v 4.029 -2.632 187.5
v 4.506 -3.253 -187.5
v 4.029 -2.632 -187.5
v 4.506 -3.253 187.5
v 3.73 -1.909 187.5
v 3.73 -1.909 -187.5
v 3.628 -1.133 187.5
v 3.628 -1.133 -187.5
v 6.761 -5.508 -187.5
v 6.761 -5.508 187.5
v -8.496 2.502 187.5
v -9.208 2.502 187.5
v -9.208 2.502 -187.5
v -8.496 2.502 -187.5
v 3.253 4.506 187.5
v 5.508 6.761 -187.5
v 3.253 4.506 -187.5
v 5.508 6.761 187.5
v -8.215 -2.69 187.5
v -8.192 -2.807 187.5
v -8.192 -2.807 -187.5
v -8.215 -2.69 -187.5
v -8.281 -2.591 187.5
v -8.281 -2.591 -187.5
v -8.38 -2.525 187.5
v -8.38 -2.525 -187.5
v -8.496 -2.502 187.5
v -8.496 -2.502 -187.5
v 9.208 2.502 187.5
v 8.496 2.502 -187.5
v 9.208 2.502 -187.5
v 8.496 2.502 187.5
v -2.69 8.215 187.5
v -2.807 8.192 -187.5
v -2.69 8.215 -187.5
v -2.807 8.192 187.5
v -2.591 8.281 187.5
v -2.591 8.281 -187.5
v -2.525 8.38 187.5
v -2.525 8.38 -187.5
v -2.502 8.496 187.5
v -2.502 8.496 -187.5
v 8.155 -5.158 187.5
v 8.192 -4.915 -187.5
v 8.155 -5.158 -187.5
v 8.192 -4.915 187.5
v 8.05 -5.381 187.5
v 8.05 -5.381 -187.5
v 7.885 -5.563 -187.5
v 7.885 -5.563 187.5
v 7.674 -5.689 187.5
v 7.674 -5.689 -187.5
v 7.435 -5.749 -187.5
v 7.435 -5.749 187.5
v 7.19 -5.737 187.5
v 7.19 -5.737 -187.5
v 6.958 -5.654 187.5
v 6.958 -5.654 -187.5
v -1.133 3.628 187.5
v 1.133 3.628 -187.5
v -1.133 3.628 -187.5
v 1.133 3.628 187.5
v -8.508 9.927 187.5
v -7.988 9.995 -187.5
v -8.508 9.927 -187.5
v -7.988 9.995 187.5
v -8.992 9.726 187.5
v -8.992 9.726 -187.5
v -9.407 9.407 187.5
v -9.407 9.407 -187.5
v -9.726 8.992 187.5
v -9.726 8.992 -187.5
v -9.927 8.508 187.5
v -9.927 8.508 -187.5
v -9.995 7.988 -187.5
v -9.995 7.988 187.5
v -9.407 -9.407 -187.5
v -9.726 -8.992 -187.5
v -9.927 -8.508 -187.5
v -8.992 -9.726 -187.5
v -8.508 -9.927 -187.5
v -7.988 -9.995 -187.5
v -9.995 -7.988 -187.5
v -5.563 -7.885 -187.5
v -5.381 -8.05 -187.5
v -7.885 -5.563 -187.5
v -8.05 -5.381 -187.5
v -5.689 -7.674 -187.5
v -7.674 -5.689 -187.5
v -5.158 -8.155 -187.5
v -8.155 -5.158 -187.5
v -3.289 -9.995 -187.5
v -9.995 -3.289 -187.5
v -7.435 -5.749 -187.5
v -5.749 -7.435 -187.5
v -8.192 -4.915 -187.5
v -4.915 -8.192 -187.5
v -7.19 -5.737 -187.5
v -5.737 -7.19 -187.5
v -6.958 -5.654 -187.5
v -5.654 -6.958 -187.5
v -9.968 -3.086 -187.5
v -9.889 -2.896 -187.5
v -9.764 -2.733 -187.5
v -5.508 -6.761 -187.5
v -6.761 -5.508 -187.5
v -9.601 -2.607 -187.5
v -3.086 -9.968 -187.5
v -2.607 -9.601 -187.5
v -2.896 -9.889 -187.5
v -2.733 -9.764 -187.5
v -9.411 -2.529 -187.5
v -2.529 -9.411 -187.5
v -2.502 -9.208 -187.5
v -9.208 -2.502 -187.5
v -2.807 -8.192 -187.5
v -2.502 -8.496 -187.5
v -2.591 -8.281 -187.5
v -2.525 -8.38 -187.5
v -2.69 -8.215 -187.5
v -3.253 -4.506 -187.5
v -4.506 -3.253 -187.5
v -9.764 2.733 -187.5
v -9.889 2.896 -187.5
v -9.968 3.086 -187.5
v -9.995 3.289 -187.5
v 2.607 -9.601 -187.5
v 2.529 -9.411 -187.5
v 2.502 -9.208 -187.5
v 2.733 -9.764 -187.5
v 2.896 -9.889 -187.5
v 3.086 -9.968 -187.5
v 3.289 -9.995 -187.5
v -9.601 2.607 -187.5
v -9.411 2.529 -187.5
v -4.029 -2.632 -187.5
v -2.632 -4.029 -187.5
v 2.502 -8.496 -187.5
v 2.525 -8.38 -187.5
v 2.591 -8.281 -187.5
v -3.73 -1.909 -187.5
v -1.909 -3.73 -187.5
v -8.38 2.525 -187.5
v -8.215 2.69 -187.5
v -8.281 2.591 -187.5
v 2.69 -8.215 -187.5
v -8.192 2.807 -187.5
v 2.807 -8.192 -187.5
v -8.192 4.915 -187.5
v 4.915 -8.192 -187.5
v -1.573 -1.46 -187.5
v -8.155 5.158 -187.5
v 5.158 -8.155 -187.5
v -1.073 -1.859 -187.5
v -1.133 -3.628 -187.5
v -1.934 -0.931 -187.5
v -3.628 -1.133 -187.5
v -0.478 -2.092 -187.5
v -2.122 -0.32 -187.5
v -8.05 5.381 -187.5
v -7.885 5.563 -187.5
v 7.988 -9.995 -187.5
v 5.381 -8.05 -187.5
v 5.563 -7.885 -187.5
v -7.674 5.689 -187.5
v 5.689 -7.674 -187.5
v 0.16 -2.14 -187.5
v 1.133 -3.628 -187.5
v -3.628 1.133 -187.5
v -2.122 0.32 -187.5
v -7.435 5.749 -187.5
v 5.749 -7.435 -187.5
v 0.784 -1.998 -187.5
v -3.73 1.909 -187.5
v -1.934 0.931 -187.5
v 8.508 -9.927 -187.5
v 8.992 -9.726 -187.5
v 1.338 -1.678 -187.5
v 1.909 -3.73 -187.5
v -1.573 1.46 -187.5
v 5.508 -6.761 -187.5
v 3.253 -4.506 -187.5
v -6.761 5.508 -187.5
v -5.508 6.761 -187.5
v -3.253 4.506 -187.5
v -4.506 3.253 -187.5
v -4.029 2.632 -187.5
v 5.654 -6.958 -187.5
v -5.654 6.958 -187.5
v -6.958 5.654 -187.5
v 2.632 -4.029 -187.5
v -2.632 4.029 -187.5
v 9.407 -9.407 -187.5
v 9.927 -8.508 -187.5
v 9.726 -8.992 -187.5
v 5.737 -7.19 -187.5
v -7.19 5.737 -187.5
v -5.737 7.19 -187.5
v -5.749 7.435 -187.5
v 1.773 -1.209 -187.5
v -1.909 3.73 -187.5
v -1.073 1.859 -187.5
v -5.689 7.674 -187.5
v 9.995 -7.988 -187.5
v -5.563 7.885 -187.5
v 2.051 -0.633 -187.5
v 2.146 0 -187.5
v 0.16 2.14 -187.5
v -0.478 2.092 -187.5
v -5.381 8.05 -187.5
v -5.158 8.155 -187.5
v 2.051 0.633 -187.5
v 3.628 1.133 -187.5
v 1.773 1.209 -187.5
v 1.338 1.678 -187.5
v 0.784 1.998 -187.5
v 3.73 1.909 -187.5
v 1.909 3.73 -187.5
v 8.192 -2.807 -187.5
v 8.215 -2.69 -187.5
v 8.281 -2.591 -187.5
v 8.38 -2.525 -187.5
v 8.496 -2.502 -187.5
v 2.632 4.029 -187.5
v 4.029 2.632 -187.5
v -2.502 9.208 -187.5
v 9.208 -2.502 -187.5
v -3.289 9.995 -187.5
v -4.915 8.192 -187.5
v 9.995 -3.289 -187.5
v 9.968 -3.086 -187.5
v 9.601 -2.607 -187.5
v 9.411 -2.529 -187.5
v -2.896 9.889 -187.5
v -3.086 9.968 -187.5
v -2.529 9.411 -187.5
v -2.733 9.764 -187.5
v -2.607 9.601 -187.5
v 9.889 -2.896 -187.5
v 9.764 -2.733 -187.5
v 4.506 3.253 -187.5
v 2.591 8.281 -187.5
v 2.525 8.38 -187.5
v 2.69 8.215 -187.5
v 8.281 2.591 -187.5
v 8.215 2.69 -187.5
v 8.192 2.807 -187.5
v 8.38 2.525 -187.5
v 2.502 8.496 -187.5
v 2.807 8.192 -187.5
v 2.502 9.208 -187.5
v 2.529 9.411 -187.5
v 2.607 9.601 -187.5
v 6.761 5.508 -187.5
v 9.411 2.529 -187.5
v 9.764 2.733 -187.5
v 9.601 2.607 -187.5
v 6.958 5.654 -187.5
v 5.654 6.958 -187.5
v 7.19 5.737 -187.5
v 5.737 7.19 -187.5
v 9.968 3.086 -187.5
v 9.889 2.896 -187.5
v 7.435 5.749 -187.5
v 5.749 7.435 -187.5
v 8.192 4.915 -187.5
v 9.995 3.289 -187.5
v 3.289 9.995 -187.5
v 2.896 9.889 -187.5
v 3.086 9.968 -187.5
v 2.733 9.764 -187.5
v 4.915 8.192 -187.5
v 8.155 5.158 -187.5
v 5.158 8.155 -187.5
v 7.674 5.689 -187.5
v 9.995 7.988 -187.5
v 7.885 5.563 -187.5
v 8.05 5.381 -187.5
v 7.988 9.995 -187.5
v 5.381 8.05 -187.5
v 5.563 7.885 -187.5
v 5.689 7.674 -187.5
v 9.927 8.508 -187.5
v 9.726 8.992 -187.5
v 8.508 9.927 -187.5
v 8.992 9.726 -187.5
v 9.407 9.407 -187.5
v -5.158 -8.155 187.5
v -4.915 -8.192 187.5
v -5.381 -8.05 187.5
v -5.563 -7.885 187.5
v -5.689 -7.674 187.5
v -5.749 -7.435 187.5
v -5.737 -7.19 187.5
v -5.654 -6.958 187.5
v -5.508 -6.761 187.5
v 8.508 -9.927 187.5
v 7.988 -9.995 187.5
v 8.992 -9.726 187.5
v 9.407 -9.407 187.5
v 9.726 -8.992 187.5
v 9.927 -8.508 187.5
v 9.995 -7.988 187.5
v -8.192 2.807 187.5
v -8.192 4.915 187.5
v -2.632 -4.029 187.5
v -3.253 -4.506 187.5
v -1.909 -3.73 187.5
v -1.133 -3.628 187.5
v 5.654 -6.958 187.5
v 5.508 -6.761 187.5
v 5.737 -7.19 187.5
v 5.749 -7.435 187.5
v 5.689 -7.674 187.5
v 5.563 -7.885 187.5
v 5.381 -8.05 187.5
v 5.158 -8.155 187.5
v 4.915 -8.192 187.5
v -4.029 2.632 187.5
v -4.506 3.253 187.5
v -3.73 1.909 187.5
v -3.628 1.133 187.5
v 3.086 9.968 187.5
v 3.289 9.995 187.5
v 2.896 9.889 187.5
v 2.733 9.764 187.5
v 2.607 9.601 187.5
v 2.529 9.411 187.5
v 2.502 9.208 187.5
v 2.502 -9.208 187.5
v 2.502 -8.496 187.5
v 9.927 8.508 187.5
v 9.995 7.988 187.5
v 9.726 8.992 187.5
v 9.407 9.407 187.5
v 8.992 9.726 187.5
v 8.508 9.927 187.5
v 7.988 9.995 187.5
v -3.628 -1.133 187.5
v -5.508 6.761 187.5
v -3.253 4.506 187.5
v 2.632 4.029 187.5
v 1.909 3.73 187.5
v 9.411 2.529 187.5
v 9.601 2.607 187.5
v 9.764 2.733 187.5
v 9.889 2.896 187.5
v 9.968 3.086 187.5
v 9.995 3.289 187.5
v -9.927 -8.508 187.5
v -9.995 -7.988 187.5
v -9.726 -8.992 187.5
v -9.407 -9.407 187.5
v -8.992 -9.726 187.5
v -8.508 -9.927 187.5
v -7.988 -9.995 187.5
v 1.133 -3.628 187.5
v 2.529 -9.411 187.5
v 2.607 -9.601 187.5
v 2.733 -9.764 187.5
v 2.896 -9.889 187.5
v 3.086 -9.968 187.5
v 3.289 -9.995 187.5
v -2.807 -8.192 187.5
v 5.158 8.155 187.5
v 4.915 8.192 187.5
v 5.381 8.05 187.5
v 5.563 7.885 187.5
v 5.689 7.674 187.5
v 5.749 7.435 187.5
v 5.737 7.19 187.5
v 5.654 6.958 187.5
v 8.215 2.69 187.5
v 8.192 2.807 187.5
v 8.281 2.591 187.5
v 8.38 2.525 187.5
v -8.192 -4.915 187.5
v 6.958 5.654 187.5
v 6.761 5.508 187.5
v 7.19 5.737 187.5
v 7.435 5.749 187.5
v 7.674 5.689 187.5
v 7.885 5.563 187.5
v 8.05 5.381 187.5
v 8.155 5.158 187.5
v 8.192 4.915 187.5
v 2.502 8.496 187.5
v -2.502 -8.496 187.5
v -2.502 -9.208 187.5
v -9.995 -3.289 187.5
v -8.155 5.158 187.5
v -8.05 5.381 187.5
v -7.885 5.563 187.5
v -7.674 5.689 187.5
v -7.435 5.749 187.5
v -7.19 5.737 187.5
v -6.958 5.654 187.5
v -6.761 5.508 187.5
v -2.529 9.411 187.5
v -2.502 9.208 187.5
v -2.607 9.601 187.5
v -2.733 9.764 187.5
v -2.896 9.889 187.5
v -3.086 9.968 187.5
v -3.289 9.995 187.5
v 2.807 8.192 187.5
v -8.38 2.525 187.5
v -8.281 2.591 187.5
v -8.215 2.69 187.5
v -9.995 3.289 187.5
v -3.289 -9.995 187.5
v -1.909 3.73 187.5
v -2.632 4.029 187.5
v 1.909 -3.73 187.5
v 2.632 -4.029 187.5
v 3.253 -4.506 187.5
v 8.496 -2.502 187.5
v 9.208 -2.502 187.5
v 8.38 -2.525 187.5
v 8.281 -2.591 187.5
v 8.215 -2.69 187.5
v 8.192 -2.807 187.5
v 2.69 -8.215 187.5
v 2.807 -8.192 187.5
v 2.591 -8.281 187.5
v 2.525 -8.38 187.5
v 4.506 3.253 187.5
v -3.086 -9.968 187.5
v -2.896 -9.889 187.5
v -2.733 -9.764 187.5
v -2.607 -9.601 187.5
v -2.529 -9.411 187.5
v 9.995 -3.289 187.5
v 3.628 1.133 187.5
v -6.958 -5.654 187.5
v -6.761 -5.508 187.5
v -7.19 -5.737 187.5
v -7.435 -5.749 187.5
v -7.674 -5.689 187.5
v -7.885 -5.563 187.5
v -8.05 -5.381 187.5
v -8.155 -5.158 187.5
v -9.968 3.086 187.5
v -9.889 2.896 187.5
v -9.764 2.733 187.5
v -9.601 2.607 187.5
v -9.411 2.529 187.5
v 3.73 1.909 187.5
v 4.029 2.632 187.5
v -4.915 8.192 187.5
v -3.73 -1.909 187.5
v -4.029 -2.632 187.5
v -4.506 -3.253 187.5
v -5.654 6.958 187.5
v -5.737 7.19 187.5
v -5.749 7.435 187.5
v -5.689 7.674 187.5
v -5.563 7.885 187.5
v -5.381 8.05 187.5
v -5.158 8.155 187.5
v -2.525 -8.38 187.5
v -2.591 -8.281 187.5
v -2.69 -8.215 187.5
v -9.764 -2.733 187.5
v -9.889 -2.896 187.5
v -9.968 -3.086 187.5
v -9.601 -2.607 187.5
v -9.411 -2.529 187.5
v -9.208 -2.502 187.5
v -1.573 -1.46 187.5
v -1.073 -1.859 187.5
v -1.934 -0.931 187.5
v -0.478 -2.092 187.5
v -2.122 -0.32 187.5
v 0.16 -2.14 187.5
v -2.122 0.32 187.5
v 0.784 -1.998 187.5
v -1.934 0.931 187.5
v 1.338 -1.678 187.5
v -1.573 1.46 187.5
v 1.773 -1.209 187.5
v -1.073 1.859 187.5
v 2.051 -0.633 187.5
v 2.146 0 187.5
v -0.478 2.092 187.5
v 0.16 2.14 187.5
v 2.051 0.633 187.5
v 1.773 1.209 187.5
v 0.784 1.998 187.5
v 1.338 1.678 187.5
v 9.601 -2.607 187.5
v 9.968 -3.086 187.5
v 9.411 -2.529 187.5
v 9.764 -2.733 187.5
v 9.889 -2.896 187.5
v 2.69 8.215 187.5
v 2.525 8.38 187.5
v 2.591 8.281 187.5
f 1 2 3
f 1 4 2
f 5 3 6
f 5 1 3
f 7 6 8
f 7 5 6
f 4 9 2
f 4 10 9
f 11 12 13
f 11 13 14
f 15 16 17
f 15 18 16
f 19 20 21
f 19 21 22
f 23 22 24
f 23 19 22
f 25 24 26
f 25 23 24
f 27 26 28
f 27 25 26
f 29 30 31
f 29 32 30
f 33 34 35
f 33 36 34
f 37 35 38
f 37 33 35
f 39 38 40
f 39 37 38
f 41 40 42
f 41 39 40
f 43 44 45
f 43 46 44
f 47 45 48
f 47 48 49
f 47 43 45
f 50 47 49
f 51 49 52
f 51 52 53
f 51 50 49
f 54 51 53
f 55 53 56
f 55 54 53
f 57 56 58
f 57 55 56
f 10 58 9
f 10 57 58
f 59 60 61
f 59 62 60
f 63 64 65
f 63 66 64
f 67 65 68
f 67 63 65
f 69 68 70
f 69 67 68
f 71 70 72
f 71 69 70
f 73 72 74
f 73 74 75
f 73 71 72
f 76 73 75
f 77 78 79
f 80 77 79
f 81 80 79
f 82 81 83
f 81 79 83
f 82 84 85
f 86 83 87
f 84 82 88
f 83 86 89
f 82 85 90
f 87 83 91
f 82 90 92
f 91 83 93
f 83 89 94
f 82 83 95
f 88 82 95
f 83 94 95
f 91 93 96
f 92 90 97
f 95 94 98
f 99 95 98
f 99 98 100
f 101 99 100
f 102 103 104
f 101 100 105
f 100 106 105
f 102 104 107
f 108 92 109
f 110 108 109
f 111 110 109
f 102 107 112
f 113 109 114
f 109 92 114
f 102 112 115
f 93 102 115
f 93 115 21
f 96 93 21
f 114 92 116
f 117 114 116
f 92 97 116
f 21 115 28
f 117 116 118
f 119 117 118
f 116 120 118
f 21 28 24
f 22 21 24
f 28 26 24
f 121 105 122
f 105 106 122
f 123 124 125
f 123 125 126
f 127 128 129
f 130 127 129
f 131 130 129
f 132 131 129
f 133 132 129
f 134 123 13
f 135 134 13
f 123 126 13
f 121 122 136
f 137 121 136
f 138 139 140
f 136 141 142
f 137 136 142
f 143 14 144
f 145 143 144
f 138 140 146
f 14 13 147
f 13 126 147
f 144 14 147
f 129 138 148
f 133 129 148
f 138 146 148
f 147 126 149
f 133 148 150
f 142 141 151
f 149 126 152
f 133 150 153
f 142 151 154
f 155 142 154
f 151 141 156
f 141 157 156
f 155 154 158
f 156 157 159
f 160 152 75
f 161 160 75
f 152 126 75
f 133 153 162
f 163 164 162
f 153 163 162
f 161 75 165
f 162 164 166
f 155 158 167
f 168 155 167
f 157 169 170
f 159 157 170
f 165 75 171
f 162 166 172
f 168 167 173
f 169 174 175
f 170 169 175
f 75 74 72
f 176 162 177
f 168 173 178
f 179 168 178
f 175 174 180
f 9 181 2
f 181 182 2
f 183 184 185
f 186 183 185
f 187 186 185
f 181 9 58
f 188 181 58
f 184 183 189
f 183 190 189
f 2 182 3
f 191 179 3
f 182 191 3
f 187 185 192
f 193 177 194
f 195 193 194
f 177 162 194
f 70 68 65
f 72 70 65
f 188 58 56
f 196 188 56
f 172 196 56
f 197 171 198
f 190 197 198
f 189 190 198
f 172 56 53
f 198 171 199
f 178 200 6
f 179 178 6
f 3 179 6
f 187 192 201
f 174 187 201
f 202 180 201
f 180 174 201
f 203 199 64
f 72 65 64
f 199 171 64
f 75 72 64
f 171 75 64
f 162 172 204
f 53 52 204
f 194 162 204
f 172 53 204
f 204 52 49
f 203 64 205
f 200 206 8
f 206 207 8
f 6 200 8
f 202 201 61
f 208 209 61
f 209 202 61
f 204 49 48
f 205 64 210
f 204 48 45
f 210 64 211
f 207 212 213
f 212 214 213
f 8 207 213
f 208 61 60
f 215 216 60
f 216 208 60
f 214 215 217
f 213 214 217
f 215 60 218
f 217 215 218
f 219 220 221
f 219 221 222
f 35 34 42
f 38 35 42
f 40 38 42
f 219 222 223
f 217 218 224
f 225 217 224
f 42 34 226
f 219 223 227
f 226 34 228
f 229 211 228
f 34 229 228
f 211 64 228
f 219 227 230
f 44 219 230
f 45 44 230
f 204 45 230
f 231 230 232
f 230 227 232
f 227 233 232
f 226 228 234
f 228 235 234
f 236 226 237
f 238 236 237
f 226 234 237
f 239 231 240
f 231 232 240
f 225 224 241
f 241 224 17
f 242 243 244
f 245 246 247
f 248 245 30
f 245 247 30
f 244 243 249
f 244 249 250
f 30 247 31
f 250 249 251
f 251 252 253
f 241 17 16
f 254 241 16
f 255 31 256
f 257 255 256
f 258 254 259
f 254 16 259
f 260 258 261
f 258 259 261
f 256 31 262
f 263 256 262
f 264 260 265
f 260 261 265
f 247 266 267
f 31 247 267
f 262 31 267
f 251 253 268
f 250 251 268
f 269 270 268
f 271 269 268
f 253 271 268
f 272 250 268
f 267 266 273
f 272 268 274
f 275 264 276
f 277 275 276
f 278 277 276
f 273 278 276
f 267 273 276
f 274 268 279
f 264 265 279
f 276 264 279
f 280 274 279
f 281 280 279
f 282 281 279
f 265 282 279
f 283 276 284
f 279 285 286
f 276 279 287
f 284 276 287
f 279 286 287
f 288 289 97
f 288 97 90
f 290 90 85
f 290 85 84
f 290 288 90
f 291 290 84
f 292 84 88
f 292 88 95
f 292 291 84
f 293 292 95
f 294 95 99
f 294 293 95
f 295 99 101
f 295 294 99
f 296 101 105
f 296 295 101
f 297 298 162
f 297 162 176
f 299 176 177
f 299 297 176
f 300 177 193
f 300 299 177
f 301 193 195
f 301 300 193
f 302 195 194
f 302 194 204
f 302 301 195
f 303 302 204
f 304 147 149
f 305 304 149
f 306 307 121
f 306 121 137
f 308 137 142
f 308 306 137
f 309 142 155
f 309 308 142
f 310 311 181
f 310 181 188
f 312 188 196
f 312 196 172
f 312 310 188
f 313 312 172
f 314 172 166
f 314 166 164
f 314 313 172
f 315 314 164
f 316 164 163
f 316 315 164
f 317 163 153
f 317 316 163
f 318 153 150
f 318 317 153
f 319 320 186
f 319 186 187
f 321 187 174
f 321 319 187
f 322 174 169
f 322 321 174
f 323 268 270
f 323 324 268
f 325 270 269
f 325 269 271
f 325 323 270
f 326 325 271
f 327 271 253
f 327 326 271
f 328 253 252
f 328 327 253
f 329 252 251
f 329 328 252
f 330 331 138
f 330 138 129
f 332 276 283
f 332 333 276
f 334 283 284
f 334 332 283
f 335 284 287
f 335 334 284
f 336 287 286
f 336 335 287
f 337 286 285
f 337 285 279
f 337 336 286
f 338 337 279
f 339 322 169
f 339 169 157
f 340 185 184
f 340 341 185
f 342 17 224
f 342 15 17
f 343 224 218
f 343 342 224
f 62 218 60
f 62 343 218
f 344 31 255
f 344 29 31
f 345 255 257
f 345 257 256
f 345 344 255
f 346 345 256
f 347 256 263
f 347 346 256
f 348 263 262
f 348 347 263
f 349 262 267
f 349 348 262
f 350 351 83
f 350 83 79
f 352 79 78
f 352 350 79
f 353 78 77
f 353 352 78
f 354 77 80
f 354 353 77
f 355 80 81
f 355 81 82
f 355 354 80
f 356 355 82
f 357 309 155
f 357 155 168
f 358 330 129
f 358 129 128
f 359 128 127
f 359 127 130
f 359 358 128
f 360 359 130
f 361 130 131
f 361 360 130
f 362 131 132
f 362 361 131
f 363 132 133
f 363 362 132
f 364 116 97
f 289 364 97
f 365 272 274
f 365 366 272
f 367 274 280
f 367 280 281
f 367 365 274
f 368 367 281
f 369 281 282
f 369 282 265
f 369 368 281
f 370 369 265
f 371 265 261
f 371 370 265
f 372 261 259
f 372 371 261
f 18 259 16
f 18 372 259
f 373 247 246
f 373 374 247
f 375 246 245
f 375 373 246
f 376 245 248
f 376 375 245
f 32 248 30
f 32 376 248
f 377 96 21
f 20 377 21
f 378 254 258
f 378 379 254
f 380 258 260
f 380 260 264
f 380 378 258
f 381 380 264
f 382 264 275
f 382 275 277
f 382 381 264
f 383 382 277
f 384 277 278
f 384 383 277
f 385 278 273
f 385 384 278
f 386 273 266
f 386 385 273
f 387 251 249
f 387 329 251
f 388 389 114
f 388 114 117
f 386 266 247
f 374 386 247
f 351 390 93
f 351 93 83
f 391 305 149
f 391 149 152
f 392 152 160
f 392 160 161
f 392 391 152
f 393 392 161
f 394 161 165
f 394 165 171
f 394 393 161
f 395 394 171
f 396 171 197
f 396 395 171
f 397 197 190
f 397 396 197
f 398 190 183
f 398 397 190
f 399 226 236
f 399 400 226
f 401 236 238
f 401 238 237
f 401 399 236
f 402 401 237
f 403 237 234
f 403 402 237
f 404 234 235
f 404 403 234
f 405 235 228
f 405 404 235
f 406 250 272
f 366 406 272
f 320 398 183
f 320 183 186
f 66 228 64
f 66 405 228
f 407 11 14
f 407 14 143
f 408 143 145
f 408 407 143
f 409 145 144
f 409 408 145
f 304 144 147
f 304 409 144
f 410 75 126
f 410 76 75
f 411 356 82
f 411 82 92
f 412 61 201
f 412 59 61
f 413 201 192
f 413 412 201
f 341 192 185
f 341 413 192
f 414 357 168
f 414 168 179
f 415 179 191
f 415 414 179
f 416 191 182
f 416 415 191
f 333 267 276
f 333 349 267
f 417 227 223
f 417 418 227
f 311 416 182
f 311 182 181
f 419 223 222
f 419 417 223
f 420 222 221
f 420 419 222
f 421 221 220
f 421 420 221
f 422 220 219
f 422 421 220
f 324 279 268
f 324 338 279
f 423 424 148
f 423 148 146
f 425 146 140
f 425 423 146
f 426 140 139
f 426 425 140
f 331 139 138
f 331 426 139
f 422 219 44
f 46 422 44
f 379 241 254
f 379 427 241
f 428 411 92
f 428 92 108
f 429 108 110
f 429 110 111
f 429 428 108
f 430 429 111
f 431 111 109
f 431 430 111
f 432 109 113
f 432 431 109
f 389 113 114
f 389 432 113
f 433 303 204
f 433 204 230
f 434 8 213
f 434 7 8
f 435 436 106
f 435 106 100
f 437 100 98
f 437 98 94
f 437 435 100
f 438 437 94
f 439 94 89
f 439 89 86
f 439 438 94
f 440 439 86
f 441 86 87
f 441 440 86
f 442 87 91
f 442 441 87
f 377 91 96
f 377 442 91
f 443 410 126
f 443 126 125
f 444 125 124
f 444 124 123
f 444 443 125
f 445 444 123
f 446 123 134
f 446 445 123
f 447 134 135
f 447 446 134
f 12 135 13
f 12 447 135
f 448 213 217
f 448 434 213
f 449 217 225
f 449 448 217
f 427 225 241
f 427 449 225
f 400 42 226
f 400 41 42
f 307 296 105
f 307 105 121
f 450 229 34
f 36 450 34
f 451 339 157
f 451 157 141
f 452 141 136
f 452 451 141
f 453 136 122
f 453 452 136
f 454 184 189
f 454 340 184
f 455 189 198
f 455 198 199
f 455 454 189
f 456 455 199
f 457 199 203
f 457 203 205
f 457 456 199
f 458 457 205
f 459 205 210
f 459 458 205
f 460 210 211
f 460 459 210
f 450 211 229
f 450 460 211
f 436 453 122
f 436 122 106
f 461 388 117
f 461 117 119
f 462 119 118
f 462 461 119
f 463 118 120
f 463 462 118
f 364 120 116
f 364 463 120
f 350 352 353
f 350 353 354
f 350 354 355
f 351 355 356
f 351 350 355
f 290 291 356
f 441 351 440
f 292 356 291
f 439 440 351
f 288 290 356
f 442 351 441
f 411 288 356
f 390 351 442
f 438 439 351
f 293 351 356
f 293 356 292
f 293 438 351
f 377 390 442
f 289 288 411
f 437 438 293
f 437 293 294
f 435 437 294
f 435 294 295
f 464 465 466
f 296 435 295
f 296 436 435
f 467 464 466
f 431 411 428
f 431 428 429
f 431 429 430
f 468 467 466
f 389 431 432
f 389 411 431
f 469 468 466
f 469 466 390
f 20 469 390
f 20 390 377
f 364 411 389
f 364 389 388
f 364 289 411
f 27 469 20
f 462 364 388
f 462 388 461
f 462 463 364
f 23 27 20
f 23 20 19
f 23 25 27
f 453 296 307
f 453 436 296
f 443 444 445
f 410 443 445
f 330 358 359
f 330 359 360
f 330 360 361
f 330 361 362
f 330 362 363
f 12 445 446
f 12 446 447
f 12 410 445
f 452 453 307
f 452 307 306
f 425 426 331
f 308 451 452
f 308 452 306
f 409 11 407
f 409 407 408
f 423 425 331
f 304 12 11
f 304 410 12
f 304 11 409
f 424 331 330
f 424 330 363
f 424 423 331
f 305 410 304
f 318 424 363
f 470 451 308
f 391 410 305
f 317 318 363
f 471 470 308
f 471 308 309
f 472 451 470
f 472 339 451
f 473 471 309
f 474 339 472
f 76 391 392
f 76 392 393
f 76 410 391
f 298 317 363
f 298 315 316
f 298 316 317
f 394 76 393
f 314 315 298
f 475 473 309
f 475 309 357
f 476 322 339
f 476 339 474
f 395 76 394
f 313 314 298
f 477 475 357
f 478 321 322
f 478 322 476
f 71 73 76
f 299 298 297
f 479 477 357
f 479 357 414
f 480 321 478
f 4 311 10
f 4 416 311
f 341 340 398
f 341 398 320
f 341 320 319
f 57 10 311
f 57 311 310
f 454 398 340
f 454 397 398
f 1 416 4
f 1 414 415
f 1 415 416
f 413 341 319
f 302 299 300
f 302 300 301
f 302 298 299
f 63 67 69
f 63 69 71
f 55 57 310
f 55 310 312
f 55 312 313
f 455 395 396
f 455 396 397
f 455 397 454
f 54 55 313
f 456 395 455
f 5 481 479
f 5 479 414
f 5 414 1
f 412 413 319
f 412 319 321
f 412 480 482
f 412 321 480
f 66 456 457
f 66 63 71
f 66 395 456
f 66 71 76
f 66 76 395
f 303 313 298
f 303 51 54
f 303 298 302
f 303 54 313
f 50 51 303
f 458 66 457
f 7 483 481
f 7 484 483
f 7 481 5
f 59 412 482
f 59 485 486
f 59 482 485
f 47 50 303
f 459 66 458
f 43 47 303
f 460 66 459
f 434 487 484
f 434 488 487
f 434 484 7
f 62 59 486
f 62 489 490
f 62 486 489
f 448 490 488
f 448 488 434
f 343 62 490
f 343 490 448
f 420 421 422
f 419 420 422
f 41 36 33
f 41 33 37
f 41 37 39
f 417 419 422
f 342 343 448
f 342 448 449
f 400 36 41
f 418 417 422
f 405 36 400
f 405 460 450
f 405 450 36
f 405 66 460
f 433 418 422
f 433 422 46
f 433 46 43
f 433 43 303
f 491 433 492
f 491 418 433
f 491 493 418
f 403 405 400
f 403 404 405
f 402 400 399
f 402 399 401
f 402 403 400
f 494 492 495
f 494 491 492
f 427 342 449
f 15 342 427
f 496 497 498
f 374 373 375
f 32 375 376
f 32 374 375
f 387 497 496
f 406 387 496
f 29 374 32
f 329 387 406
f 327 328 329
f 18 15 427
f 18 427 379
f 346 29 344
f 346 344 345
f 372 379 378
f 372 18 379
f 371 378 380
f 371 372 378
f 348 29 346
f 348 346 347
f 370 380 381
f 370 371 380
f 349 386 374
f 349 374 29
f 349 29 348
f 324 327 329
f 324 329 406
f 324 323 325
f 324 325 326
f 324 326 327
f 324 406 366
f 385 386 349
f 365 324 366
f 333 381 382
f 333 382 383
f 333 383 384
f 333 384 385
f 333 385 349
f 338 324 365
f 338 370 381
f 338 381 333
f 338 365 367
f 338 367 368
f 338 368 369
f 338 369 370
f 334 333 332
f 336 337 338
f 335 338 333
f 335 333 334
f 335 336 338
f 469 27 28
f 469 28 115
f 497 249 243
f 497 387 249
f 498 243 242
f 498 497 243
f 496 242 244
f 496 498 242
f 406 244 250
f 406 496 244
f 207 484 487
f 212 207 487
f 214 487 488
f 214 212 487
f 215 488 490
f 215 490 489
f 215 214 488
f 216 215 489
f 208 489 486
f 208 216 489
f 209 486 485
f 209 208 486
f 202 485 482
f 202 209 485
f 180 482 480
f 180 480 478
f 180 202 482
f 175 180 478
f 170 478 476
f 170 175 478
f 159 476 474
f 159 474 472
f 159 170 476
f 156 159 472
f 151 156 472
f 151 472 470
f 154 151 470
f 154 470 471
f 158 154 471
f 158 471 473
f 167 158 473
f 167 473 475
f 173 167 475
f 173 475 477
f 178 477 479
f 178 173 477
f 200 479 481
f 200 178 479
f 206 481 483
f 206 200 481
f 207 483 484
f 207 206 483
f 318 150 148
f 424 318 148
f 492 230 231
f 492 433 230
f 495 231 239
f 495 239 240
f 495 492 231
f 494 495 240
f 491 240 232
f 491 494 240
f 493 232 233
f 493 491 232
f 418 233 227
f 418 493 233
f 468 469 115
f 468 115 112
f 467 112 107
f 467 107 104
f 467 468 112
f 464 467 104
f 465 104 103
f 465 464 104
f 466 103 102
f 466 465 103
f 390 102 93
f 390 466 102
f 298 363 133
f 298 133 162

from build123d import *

# Parameters (mm, degrees)
SKETCH1_R           = 2.1463
BOSS_EXTRUDE1_DEPTH = 187.5


with BuildPart() as part:
    # Sketch1 → Boss-Extrude1 (new body, symmetric)
    with BuildSketch(Plane.XY):
        with BuildLine():
            Line((-9.9949, 7.9883), (-9.9949, 3.2893))
            ThreePointArc((-9.9949, 3.2893), (-9.76427588, 2.73252412), (-9.2075, 2.5019))
            Line((-9.2075, 2.5019), (-8.4963, 2.5019))
            ThreePointArc((-8.4963, 2.5019), (-8.280773853, 2.591173853), (-8.1915, 2.8067))
            Line((-8.1915, 2.8067), (-8.1915, 4.9149))
            ThreePointArc((-8.1915, 4.9149), (-7.674065253, 5.689295824), (-6.760603096, 5.507596904))
            Line((-6.760603096, 5.507596904), (-4.505765747, 3.252759555))
            ThreePointArc((-4.505765747, 3.252759555), (-3.856054457, 2.280397894), (-3.627906192, 1.133419111))
            Line((-3.627906192, 1.133419111), (-3.627906192, -1.133419111))
            ThreePointArc((-3.627906192, -1.133419111), (-3.856054457, -2.280397894), (-4.505765747, -3.252759555))
            Line((-4.505765747, -3.252759555), (-6.760603096, -5.507596904))
            ThreePointArc((-6.760603096, -5.507596904), (-7.674065253, -5.689295824), (-8.1915, -4.9149))
            Line((-8.1915, -4.9149), (-8.1915, -2.8067))
            ThreePointArc((-8.1915, -2.8067), (-8.280773853, -2.591173853), (-8.4963, -2.5019))
            Line((-8.4963, -2.5019), (-9.2075, -2.5019))
            ThreePointArc((-9.2075, -2.5019), (-9.76427588, -2.73252412), (-9.9949, -3.2893))
            Line((-9.9949, -3.2893), (-9.9949, -7.9883))
            ThreePointArc((-9.9949, -7.9883), (-9.407180467, -9.407180467), (-7.9883, -9.9949))
            Line((-7.9883, -9.9949), (-3.2893, -9.9949))
            ThreePointArc((-3.2893, -9.9949), (-2.73252412, -9.76427588), (-2.5019, -9.2075))
            Line((-2.5019, -9.2075), (-2.5019, -8.4963))
            ThreePointArc((-2.5019, -8.4963), (-2.591173853, -8.280773853), (-2.8067, -8.1915))
            Line((-2.8067, -8.1915), (-4.9149, -8.1915))
            ThreePointArc((-4.9149, -8.1915), (-5.689295824, -7.674065253), (-5.507596904, -6.760603096))
            Line((-5.507596904, -6.760603096), (-3.252759555, -4.505765747))
            ThreePointArc((-3.252759555, -4.505765747), (-2.280397894, -3.856054457), (-1.133419111, -3.627906192))
            Line((-1.133419111, -3.627906192), (1.133419111, -3.627906192))
            ThreePointArc((1.133419111, -3.627906192), (2.280397894, -3.856054457), (3.252759555, -4.505765747))
            Line((3.252759555, -4.505765747), (5.507596904, -6.760603096))
            ThreePointArc((5.507596904, -6.760603096), (5.689295824, -7.674065253), (4.9149, -8.1915))
            Line((4.9149, -8.1915), (2.8067, -8.1915))
            ThreePointArc((2.8067, -8.1915), (2.591173853, -8.280773853), (2.5019, -8.4963))
            Line((2.5019, -8.4963), (2.5019, -9.2075))
            ThreePointArc((2.5019, -9.2075), (2.73252412, -9.76427588), (3.2893, -9.9949))
            Line((3.2893, -9.9949), (7.9883, -9.9949))
            ThreePointArc((7.9883, -9.9949), (9.407180467, -9.407180467), (9.9949, -7.9883))
            Line((9.9949, -7.9883), (9.9949, -3.2893))
            ThreePointArc((9.9949, -3.2893), (9.76427588, -2.73252412), (9.2075, -2.5019))
            Line((9.2075, -2.5019), (8.4963, -2.5019))
            ThreePointArc((8.4963, -2.5019), (8.280773853, -2.591173853), (8.1915, -2.8067))
            Line((8.1915, -2.8067), (8.1915, -4.9149))
            ThreePointArc((8.1915, -4.9149), (7.674065253, -5.689295824), (6.760603096, -5.507596904))
            Line((6.760603096, -5.507596904), (4.505765747, -3.252759555))
            ThreePointArc((4.505765747, -3.252759555), (3.856054457, -2.280397894), (3.627906192, -1.133419111))
            Line((3.627906192, -1.133419111), (3.627906192, 1.133419111))
            ThreePointArc((3.627906192, 1.133419111), (3.856054457, 2.280397894), (4.505765747, 3.252759555))
            Line((4.505765747, 3.252759555), (6.760603096, 5.507596904))
            ThreePointArc((6.760603096, 5.507596904), (7.674065253, 5.689295824), (8.1915, 4.9149))
            Line((8.1915, 4.9149), (8.1915, 2.8067))
            ThreePointArc((8.1915, 2.8067), (8.280773853, 2.591173853), (8.4963, 2.5019))
            Line((8.4963, 2.5019), (9.2075, 2.5019))
            ThreePointArc((9.2075, 2.5019), (9.76427588, 2.73252412), (9.9949, 3.2893))
            Line((9.9949, 3.2893), (9.9949, 7.9883))
            ThreePointArc((9.9949, 7.9883), (9.407180467, 9.407180467), (7.9883, 9.9949))
            Line((7.9883, 9.9949), (3.2893, 9.9949))
            ThreePointArc((3.2893, 9.9949), (2.73252412, 9.76427588), (2.5019, 9.2075))
            Line((2.5019, 9.2075), (2.5019, 8.4963))
            ThreePointArc((2.5019, 8.4963), (2.591173853, 8.280773853), (2.8067, 8.1915))
            Line((2.8067, 8.1915), (4.9149, 8.1915))
            ThreePointArc((4.9149, 8.1915), (5.689295824, 7.674065253), (5.507596904, 6.760603096))
            Line((5.507596904, 6.760603096), (3.252759555, 4.505765747))
            ThreePointArc((3.252759555, 4.505765747), (2.280397894, 3.856054457), (1.133419111, 3.627906192))
            Line((1.133419111, 3.627906192), (-1.133419111, 3.627906192))
            ThreePointArc((-1.133419111, 3.627906192), (-2.280397894, 3.856054457), (-3.252759555, 4.505765747))
            Line((-3.252759555, 4.505765747), (-5.507596904, 6.760603096))
            ThreePointArc((-5.507596904, 6.760603096), (-5.689295824, 7.674065253), (-4.9149, 8.1915))
            Line((-4.9149, 8.1915), (-2.8067, 8.1915))
            ThreePointArc((-2.8067, 8.1915), (-2.591173853, 8.280773853), (-2.5019, 8.4963))
            Line((-2.5019, 8.4963), (-2.5019, 9.2075))
            ThreePointArc((-2.5019, 9.2075), (-2.73252412, 9.76427588), (-3.2893, 9.9949))
            Line((-3.2893, 9.9949), (-7.9883, 9.9949))
            ThreePointArc((-7.9883, 9.9949), (-9.407180467, 9.407180467), (-9.9949, 7.9883))
        make_face()
        Circle(SKETCH1_R, mode=Mode.SUBTRACT)
    extrude(amount=BOSS_EXTRUDE1_DEPTH, both=True)


solid = part.part
